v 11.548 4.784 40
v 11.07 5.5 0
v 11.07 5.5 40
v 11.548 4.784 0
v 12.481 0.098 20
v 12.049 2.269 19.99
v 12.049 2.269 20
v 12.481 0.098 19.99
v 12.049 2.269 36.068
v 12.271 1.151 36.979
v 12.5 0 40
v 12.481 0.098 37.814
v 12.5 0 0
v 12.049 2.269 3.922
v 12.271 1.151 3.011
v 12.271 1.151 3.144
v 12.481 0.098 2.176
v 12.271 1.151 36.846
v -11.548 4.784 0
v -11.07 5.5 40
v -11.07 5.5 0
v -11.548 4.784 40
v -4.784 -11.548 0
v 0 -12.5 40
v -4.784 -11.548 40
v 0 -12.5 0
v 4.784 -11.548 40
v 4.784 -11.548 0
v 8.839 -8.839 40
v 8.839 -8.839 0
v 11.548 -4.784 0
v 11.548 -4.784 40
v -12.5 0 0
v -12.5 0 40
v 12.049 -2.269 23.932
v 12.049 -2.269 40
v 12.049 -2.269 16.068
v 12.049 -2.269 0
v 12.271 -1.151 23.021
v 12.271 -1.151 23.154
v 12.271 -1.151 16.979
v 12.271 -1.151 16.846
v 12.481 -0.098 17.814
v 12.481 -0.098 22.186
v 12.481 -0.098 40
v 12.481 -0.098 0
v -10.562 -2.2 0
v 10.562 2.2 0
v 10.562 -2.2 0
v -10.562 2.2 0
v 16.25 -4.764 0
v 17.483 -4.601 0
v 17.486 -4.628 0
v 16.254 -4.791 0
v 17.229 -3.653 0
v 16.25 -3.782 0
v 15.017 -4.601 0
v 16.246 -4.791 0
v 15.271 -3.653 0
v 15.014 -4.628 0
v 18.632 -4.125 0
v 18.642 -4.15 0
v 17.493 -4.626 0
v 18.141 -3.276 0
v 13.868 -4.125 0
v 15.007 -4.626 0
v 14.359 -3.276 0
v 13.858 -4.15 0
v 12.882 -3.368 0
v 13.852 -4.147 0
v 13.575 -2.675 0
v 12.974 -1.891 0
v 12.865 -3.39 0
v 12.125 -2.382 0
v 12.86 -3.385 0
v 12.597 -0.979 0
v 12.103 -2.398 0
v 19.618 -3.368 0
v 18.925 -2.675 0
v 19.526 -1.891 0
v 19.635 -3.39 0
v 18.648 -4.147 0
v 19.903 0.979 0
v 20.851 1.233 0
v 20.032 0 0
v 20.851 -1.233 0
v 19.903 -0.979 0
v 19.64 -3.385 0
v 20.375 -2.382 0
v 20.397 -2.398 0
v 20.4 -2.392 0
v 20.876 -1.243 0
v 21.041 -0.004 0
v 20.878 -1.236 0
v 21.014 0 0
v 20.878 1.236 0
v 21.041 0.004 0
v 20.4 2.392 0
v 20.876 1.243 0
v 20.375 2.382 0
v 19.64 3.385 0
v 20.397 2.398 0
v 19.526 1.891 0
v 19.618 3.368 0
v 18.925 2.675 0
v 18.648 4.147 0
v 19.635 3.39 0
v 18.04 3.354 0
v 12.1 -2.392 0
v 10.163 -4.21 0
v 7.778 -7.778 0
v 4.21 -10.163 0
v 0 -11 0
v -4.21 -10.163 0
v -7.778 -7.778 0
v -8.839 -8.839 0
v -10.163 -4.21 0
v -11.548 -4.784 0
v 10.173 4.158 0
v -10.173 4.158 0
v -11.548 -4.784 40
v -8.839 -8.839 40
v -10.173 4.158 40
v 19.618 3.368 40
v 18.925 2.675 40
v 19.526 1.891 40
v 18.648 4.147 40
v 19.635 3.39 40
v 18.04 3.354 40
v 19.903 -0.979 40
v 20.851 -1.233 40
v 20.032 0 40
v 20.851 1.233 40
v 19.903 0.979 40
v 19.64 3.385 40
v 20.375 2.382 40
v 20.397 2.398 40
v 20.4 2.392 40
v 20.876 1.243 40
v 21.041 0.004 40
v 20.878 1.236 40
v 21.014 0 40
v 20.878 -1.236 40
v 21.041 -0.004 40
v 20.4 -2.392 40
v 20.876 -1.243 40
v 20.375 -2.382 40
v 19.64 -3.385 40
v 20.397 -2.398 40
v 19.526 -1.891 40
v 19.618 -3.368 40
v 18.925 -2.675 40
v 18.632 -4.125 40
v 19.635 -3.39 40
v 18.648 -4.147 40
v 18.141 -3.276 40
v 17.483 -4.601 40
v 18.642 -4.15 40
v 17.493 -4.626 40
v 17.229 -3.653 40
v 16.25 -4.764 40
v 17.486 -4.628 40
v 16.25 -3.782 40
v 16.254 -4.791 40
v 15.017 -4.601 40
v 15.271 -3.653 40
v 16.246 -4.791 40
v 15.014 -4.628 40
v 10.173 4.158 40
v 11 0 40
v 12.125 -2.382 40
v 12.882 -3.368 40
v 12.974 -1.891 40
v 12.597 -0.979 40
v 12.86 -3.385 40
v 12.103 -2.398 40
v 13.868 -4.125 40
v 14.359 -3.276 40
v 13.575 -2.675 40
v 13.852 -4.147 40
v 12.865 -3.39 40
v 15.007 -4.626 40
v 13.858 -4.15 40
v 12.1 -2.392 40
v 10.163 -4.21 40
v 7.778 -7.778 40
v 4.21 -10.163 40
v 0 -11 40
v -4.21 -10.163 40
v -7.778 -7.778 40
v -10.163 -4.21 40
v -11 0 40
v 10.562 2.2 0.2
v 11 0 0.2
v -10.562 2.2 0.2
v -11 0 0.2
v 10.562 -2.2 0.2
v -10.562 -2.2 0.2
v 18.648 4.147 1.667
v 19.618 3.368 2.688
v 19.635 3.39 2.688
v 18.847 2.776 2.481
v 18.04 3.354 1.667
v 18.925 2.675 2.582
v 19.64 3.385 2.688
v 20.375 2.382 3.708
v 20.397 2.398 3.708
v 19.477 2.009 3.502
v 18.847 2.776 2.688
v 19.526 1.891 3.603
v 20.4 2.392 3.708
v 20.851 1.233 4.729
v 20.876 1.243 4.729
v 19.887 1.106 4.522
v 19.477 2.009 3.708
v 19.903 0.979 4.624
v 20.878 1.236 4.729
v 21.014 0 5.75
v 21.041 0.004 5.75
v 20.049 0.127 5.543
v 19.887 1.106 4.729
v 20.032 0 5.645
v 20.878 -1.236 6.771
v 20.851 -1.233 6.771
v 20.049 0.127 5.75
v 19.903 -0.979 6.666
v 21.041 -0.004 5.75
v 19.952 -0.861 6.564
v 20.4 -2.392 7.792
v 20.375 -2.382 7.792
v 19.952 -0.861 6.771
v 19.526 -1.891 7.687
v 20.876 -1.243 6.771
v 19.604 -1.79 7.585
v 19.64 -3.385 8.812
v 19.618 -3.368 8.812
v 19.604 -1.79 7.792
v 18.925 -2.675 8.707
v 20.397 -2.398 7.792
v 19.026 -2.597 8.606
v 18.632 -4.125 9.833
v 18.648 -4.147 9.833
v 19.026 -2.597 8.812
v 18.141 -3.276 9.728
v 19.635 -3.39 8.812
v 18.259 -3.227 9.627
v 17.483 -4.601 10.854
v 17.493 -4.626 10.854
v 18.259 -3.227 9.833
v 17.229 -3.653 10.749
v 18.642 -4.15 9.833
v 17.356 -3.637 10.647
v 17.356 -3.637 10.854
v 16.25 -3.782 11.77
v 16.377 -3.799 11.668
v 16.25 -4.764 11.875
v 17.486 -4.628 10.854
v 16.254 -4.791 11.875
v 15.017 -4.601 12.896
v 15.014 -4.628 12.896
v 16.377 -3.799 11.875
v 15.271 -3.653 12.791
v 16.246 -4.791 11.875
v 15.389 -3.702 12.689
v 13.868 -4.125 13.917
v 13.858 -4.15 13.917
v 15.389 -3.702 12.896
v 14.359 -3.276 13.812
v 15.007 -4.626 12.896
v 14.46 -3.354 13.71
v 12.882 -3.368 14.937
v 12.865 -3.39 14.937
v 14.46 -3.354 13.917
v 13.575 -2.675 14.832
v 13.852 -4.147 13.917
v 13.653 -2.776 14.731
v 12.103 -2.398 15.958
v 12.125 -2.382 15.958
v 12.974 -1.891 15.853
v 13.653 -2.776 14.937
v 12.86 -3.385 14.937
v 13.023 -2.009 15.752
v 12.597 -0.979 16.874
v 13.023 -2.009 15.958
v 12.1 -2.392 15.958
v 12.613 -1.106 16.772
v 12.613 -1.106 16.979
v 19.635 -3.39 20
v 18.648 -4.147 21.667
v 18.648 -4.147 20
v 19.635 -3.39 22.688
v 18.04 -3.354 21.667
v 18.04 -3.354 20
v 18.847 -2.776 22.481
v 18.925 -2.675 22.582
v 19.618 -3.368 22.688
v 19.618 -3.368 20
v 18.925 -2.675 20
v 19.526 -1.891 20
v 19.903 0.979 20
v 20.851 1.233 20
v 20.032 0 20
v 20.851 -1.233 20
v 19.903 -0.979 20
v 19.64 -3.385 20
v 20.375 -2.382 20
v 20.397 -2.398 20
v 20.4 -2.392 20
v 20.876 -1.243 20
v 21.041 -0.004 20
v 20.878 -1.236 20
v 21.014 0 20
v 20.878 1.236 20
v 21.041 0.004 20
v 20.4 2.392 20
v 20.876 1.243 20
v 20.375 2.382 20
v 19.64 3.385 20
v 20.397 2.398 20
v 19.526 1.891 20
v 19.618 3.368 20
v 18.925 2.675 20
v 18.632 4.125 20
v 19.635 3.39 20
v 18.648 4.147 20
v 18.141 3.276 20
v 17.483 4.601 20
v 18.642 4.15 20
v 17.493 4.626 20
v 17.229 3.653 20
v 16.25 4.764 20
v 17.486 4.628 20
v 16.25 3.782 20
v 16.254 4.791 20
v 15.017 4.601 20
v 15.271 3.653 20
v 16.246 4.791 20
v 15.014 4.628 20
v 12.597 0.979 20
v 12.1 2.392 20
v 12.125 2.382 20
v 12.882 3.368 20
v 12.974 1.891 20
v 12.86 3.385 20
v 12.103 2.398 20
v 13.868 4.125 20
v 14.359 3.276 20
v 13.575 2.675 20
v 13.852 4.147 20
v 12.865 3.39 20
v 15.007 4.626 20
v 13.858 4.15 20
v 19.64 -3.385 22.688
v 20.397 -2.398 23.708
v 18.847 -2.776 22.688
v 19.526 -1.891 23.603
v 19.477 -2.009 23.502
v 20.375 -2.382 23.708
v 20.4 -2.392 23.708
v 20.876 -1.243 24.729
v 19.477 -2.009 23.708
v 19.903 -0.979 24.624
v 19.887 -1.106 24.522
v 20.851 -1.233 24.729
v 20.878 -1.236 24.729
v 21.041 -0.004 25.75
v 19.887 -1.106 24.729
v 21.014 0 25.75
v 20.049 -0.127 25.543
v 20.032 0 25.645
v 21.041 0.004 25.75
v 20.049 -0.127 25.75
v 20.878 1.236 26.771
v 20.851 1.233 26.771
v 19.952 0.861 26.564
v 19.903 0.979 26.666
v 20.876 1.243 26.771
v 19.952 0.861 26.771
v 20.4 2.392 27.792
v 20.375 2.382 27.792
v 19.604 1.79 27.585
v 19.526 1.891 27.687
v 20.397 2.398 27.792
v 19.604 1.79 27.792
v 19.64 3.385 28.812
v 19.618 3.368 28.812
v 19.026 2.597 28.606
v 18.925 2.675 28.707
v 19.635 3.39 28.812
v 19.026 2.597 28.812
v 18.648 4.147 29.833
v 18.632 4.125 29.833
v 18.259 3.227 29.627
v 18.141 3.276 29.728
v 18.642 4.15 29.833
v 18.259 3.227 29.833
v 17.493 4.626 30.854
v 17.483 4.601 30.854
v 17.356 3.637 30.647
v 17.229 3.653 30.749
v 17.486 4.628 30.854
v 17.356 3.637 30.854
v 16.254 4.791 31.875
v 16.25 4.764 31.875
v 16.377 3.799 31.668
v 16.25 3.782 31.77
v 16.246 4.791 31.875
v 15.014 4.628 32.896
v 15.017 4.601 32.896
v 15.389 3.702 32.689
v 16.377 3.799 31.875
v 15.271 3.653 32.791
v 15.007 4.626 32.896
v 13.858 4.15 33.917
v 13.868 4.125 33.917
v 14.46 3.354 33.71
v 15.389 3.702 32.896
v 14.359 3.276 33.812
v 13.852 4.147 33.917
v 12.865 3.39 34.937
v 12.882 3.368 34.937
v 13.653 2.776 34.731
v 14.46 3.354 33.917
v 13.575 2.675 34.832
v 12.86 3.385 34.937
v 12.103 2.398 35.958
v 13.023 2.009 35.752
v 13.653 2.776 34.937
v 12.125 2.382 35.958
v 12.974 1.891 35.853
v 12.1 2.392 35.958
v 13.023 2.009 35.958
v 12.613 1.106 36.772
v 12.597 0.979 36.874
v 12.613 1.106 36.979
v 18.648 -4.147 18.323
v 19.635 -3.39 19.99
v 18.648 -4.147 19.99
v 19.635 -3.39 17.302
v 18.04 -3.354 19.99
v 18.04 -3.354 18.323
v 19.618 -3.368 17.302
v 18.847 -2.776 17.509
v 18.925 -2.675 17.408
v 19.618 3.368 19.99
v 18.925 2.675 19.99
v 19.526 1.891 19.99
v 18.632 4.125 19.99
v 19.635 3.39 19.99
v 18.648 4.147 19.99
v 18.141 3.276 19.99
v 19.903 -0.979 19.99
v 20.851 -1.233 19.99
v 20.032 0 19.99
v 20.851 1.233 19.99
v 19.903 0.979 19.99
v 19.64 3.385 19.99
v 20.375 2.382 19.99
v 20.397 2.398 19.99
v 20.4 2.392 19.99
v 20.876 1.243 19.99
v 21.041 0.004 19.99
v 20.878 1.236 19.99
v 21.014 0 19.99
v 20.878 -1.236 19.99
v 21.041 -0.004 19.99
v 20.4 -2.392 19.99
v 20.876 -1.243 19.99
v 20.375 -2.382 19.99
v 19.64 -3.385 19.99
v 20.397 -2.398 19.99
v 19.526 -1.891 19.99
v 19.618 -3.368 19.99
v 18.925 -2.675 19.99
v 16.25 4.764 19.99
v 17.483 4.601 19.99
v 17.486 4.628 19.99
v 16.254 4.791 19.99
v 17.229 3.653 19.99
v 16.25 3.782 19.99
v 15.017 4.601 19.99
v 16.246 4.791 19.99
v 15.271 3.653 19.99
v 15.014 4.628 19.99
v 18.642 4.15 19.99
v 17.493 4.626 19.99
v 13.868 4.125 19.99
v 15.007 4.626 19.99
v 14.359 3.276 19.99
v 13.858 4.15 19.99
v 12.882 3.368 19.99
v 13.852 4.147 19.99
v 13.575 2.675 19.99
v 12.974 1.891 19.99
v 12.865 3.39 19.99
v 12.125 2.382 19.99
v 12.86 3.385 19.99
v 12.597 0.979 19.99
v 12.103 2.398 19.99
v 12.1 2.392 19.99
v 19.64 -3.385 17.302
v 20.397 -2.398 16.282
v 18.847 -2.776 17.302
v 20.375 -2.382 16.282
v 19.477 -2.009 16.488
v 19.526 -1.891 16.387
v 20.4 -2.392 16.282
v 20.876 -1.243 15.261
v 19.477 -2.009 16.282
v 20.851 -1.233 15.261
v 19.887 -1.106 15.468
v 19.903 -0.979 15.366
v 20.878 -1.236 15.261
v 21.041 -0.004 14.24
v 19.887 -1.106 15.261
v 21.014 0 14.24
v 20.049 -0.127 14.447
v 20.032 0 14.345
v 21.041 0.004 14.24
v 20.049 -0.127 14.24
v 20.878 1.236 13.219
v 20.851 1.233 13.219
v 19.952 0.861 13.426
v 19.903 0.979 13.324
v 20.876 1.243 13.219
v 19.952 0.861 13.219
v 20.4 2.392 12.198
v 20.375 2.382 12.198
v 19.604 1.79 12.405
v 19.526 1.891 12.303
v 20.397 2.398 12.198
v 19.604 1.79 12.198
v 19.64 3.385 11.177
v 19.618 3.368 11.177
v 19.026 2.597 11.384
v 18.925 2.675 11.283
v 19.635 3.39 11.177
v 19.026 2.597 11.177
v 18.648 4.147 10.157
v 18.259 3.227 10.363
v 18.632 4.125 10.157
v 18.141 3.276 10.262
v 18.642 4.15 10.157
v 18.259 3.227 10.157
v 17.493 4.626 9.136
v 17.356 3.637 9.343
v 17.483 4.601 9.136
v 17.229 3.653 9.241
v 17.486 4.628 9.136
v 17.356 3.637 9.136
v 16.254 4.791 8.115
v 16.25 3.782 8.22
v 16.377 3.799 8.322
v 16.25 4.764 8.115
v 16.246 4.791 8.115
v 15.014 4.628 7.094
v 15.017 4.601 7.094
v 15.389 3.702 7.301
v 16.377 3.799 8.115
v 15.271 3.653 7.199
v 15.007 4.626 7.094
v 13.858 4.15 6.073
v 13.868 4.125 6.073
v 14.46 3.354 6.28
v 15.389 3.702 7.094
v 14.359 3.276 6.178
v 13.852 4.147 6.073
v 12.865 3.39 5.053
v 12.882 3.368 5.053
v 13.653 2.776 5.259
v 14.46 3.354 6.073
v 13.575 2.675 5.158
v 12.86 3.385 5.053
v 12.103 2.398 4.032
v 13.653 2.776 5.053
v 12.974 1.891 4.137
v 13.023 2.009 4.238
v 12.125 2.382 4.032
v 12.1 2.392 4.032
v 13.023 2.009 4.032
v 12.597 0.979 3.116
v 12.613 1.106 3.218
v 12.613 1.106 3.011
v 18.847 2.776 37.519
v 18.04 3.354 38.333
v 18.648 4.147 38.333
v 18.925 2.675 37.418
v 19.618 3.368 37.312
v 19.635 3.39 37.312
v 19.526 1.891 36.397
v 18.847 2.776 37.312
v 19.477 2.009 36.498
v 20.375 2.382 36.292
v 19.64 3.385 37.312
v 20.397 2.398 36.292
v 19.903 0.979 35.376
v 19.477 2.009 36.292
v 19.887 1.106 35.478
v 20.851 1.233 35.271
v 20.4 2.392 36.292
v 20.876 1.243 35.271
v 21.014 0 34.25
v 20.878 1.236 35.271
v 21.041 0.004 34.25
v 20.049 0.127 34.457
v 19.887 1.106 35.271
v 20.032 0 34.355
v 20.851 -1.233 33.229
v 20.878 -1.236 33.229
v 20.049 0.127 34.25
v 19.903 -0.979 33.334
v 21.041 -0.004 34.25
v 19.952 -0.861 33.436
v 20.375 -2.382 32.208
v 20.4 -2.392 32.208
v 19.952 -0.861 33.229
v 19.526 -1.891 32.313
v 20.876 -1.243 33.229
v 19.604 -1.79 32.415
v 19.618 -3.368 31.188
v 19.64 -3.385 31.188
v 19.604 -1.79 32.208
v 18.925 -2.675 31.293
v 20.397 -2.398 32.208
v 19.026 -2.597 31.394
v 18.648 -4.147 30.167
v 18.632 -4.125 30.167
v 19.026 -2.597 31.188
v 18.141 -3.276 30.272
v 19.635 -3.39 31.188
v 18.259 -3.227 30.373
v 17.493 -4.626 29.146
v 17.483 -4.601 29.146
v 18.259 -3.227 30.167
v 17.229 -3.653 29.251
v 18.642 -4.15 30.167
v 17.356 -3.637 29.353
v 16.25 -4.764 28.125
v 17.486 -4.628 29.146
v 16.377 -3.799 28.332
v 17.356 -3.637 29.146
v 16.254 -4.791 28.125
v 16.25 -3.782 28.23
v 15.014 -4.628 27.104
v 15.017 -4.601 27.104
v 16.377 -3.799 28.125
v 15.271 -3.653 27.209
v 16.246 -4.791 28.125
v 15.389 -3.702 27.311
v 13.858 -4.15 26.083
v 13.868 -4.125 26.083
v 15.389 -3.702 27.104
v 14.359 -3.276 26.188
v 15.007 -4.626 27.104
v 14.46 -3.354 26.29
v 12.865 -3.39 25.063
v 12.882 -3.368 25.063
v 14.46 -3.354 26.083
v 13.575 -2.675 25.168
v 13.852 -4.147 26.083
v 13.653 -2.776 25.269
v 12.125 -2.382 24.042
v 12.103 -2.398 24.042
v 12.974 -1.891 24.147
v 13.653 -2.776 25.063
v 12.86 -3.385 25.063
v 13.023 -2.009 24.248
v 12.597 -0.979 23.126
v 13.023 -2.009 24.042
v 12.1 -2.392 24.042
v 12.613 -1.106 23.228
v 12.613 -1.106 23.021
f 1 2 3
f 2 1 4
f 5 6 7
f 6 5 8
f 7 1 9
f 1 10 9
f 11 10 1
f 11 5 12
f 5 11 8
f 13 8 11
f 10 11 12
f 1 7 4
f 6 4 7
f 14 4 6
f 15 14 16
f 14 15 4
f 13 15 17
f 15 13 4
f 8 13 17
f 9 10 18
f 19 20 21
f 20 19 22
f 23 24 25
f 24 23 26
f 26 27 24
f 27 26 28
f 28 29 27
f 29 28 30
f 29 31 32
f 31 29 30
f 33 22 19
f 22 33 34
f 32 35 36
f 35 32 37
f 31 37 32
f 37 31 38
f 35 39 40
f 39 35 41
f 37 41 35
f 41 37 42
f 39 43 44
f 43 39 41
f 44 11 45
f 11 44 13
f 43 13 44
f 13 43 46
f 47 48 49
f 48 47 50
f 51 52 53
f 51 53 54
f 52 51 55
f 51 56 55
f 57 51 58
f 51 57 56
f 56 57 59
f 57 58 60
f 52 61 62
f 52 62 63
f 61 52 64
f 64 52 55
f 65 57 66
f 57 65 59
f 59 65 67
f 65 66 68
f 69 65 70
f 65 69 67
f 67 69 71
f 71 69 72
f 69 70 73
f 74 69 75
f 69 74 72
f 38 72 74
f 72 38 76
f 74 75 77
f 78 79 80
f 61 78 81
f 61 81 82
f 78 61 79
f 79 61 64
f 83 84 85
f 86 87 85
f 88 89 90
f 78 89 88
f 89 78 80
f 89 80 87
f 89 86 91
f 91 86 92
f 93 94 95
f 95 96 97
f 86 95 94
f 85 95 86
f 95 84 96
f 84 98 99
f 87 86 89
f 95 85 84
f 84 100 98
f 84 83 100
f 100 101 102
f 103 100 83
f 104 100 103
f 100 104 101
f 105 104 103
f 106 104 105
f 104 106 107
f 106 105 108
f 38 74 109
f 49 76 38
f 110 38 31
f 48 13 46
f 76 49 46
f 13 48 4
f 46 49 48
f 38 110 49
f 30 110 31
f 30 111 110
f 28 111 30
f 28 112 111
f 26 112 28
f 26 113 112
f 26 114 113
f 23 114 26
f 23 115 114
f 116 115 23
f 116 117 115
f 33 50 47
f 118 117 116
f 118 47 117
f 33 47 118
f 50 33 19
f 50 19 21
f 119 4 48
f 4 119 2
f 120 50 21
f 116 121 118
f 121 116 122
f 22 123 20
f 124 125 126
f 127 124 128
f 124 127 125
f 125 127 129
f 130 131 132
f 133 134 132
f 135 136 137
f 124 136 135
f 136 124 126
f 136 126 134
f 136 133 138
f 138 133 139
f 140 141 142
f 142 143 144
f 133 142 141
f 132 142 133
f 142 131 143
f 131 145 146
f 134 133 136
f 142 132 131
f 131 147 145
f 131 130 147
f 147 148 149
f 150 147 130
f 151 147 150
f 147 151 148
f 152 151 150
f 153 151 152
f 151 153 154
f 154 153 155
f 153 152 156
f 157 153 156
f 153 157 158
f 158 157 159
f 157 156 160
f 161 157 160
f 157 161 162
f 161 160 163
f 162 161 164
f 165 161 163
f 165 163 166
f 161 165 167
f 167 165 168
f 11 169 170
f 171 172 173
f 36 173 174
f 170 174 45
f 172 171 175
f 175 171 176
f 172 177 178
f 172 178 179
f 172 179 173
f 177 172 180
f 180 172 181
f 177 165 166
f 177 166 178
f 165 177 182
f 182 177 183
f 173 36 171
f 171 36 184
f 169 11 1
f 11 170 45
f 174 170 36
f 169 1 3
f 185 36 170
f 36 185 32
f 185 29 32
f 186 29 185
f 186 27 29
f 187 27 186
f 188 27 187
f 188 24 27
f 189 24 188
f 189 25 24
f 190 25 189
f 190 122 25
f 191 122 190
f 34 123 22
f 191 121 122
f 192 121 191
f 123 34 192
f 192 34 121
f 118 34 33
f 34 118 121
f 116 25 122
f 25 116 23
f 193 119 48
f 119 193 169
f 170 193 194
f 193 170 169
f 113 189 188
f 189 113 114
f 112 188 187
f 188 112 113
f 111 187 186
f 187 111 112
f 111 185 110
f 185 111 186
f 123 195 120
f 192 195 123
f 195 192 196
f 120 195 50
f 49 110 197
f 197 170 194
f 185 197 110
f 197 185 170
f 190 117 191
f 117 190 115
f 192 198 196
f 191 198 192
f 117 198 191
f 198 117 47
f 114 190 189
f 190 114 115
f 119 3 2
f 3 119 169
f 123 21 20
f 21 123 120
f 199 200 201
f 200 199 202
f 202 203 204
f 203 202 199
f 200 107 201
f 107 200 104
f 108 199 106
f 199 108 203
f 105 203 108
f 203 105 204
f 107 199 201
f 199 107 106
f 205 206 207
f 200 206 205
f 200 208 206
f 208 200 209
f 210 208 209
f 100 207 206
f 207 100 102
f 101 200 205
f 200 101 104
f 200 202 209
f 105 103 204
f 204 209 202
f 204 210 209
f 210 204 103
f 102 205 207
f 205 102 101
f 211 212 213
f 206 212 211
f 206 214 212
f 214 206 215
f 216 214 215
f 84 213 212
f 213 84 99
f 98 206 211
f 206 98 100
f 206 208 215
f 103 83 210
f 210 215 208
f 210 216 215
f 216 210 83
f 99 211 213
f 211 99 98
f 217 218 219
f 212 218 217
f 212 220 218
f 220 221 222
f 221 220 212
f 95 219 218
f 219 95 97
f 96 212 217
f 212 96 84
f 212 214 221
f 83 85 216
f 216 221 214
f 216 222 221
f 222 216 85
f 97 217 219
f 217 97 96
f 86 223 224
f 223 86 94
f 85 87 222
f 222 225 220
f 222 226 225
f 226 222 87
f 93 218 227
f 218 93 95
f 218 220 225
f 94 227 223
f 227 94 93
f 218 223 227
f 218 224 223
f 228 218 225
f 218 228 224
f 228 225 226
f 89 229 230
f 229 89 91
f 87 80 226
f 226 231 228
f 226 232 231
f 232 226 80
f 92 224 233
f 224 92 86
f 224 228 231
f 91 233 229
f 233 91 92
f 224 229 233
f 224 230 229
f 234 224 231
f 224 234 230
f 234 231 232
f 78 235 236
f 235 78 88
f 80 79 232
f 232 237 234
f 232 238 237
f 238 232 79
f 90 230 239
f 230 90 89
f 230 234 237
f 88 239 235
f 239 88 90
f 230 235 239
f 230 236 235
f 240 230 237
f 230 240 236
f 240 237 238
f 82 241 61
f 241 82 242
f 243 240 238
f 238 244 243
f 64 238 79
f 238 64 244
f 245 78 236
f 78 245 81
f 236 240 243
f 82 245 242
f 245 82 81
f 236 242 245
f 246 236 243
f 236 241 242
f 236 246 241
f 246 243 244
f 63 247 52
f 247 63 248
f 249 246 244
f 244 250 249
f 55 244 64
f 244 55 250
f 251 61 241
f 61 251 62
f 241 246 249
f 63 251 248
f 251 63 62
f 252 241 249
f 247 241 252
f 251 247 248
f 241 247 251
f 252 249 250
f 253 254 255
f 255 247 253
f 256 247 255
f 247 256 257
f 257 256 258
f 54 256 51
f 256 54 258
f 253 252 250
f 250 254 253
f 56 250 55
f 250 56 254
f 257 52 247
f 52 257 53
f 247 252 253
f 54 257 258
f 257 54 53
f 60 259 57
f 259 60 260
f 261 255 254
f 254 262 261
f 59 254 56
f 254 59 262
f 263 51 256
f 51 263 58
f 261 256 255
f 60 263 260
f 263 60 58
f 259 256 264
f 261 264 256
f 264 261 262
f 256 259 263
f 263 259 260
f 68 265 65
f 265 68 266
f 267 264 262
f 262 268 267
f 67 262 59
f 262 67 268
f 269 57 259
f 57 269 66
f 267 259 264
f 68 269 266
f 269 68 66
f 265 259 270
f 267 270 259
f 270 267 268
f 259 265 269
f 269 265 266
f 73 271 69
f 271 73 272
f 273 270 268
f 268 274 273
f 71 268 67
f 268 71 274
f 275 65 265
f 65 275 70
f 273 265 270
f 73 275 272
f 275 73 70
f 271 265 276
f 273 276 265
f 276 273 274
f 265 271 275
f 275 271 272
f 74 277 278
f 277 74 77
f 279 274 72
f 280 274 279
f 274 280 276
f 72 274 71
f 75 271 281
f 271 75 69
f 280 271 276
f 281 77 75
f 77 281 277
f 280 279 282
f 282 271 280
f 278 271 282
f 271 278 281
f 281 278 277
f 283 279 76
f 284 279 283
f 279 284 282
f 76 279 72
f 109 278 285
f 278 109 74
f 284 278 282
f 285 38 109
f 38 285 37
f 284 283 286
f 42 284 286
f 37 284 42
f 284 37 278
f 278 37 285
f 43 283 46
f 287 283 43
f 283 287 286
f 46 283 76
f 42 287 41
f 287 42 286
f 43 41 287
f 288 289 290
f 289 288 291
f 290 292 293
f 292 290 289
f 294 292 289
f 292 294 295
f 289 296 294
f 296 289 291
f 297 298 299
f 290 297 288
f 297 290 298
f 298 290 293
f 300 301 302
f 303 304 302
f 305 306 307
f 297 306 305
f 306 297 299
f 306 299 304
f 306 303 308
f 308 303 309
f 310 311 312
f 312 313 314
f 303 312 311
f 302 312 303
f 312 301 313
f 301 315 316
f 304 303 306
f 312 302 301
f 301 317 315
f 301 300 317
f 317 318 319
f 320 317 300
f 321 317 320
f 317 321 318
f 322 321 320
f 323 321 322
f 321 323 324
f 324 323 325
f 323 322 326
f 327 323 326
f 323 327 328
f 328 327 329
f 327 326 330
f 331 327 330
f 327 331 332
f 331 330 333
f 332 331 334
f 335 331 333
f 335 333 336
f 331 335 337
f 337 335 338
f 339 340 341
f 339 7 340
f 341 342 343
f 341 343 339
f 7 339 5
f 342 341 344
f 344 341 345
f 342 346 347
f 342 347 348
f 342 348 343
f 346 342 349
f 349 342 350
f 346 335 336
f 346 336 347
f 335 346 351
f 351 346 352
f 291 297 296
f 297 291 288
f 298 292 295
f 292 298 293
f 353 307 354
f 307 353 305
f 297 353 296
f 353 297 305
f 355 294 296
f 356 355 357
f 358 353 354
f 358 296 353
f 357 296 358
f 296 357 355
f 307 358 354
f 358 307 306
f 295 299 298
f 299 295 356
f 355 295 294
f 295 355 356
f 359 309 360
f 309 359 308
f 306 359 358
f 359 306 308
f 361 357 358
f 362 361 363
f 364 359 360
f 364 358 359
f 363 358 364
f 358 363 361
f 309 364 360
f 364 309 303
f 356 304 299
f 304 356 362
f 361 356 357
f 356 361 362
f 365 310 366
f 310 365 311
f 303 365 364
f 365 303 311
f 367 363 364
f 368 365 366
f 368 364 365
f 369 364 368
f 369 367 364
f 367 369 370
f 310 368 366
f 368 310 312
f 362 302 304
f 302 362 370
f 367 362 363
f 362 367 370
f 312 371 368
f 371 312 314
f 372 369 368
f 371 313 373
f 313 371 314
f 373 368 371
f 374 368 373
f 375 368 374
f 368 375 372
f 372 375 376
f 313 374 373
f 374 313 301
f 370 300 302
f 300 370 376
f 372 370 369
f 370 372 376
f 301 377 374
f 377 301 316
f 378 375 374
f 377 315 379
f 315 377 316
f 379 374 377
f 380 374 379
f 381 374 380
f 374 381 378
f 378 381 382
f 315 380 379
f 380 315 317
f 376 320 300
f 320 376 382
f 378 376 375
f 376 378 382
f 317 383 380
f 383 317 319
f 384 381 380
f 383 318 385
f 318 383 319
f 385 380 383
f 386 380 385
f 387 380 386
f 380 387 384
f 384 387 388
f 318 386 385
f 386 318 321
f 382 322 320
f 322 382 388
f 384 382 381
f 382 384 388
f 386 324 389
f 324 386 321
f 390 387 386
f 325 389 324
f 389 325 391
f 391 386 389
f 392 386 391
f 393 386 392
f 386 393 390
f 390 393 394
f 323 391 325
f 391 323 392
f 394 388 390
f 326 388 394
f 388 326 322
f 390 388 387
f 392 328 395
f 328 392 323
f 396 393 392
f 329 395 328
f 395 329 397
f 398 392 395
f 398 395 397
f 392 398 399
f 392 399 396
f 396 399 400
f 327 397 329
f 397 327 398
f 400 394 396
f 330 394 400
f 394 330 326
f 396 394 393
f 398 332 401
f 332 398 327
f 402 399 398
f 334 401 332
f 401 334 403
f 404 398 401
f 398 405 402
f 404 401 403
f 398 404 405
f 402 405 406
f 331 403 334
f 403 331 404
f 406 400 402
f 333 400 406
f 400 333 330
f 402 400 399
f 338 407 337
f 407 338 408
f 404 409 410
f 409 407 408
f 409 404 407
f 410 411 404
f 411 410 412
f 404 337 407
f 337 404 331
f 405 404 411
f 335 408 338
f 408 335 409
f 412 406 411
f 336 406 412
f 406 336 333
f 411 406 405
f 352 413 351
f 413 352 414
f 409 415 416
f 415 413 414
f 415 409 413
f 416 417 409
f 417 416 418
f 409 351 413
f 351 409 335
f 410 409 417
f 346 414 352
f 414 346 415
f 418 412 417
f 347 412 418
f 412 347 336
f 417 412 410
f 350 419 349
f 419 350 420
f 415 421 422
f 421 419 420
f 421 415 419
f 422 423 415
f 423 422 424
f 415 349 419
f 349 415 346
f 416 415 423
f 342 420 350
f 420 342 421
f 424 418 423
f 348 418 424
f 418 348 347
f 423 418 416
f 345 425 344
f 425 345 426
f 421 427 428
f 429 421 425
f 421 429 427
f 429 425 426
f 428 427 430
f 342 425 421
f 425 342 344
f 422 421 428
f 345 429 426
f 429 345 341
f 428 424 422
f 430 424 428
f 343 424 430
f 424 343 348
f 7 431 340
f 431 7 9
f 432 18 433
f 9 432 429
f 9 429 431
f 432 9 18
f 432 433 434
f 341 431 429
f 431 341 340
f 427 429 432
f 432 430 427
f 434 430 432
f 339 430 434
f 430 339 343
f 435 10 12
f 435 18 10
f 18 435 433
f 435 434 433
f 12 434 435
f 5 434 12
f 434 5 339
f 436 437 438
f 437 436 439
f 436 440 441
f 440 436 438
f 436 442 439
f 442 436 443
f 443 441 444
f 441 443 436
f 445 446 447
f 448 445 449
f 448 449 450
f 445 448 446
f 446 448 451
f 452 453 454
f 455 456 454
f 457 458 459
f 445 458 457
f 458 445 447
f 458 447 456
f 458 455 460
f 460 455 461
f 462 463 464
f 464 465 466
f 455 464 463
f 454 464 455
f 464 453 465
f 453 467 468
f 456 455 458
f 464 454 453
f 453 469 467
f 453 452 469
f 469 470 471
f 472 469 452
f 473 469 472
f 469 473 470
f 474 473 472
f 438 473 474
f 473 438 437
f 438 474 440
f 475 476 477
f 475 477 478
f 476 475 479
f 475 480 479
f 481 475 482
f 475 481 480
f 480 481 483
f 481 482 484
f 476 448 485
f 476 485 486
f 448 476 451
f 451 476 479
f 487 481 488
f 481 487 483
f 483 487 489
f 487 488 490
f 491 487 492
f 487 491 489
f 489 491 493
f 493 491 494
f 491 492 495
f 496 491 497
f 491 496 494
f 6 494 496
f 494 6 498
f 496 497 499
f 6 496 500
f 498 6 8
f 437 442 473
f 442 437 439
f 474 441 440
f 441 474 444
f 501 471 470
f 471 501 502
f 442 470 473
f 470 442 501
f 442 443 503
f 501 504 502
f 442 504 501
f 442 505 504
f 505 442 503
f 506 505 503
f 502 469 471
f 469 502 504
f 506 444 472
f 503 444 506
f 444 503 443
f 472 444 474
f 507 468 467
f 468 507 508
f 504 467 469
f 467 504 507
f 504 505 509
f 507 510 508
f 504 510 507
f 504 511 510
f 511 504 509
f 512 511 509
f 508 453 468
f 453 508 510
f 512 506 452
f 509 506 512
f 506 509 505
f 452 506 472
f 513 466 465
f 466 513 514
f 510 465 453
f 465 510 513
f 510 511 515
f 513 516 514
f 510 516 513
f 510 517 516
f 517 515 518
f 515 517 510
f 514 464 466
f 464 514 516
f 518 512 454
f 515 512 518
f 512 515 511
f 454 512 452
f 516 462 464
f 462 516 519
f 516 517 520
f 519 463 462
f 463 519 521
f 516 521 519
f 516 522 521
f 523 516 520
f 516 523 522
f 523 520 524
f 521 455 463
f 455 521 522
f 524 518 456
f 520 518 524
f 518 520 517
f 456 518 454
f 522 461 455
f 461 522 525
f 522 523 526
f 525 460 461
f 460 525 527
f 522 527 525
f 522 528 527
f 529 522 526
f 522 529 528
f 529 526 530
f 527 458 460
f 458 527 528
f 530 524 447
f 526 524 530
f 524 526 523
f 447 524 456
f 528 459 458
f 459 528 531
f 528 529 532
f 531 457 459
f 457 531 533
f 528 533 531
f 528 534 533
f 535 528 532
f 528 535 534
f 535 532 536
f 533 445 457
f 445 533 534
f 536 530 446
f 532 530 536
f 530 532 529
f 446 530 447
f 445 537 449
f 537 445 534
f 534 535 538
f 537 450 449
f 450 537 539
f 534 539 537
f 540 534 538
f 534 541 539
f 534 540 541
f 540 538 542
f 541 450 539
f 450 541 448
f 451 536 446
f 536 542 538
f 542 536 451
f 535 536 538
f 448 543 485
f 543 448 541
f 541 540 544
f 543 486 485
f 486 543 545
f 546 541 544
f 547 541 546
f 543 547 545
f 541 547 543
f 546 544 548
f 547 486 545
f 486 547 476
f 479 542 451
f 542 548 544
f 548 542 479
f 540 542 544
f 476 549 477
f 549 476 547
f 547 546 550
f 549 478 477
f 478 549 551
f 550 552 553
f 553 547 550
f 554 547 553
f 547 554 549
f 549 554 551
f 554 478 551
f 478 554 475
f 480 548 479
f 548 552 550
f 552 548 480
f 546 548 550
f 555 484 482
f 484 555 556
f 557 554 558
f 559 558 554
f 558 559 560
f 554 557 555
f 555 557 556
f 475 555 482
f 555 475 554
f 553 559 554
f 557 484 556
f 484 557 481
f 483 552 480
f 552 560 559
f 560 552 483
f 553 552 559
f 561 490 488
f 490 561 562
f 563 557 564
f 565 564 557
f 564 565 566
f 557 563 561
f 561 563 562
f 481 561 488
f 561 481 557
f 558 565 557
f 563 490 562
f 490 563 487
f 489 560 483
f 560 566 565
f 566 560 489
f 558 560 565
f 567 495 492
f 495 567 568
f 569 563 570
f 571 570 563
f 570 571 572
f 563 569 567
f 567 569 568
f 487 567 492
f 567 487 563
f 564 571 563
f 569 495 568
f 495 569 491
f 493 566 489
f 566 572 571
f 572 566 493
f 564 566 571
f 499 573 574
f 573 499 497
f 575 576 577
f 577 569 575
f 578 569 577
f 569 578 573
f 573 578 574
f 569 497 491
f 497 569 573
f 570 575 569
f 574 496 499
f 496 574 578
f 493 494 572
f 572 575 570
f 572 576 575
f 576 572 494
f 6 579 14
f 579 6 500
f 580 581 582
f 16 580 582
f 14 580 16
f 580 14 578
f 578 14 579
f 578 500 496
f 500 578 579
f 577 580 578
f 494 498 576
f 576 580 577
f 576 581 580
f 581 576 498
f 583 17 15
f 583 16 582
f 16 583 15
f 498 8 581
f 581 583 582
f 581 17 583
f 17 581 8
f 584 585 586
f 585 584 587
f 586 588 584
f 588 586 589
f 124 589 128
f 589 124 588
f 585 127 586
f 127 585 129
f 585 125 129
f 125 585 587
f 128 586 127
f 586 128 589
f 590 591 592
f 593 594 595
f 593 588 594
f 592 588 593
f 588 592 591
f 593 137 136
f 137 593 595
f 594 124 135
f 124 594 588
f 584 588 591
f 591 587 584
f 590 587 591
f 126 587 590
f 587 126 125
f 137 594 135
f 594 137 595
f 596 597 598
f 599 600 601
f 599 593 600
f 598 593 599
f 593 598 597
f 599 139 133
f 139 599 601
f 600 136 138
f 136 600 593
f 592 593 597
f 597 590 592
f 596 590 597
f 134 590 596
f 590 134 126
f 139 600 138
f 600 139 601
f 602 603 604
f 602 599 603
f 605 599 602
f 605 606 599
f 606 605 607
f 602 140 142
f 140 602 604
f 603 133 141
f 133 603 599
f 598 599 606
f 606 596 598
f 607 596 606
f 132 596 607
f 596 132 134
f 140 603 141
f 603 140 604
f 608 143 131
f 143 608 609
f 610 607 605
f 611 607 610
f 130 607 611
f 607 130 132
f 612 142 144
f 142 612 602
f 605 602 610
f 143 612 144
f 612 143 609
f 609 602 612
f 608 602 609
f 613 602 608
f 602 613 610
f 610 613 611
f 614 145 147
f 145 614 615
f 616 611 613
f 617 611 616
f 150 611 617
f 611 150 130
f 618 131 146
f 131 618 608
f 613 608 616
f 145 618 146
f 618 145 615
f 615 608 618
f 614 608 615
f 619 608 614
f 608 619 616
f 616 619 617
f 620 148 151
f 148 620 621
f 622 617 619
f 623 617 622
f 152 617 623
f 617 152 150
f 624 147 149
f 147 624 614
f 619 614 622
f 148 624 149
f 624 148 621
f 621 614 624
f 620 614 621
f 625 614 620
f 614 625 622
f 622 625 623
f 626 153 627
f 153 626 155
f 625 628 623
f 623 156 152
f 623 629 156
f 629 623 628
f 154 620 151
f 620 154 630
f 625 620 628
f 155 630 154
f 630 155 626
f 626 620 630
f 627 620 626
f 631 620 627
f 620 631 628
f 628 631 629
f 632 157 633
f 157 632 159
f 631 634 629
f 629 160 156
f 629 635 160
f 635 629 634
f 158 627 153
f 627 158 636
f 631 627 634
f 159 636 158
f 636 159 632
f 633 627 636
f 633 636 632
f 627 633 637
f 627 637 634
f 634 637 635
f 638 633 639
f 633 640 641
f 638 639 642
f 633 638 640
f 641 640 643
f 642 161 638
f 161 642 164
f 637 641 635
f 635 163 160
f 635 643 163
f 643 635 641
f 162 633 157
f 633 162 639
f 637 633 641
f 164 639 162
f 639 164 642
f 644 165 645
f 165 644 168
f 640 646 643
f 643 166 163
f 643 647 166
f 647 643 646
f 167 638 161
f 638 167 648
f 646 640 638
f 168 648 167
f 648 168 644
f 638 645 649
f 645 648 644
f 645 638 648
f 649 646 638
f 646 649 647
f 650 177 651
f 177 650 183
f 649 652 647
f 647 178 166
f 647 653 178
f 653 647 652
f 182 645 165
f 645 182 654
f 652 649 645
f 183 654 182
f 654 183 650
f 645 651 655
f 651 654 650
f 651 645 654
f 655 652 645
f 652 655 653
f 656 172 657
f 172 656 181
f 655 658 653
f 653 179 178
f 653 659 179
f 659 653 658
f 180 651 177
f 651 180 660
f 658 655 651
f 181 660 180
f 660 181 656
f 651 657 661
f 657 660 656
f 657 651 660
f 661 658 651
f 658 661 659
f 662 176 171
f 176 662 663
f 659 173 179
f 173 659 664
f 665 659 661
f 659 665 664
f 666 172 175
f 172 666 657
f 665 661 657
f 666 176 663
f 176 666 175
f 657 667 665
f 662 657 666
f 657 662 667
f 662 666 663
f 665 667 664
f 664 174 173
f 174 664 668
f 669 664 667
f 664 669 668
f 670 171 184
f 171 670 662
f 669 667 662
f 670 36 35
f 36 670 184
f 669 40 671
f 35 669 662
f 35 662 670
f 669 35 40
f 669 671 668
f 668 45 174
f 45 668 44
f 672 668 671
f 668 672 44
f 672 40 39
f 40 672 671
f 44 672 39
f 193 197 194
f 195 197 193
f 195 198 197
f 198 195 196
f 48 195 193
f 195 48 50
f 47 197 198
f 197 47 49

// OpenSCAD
// GasStrutWireClip.scad
//
// Clip for retaining wire on gas strut supporting lifting roof
//

delta = 0.01 ;

module helixringsegment(r1, r2, sh1, sh2, sn, ns, sw) {
    assert(r2>r1, "helixring: angle r2 must be greater than r1") ;
    translate([r2,0,0])
        rotate([0, -90, 0])
            linear_extrude(height=(r2-r1), center=false)
                polygon(
                    points = [ [0,-sw/2], [sh1,-sw/2], [sh2, sw/2], [0,sw/2] ],
                    paths  = [ [ 0, 1, 2, 3, 0 ] ]
                ) ;
    // cube(size=[h1, h2, r2]) ;
}
////-helixringsegment(r1, r2, h, sn, ns, sw)-
// helixringsegment(10, 12, 20, 10, 20, 3) ;

// Helical ring.  Used as part of wire-retaining hooks.
//
// The helix allows the ring to be printed without support.
//
// The ring has a "flat" end which is normal to the centre axis,
// and a sloping edge that progresses from 0 to "h" around the
// circumference, proceeding anticlockwise as viewed from +Z.
//
// The "flat" end of the ring lies on the X-Y plane, centred on 
// the origin, with the sloping edge progressing in the +Z direction.
//
// r1	= inner radius of ring
// r2   = outer radius of ring
// d1   = inner diameter of ring
// d2   = outer diameter of ring
// h1   = start height of helix
// h2   = end height of helix, overall height of ring ((a2-a1)/pi for 45 degree climb)
// a1   = start angle of ring (zero height)
// a2   = end angle of ring (full height h)
// ns   = number of steps (goes 0 to ns-1)
//

module helixring(r1=0, r2=0, d1=0, d2=0, h1=0, h2=0, a1=0, a2=180, ns=16) {
    r1 = r1 != 0 ? r1 : d1/2 ;      // Use d1 if r1 is zero
    r2 = r2 != 0 ? r2 : d2/2 ;      // Use d2 if r2 is zero
    ar = (a2-a1)*PI/180 ;           // Sweep angle in radians
    sw = r2*ar/ns ;                 // Segment width
    /// assert(a2>a1, "helixring: angle a2 must be greater than a1") ;
    assert(r2>r1, "helixring: angle r2 must be greater than r1") ;
    difference() {
        translate([0,0, 0]) {
            for (sn = [0:ns-1]) {
                a   = a1 + ((sn+0.5)/ns)*(a2-a1) ;
                sh1 = h1 + (sn/ns) * (h2-h1) ;
                sh2 = h1 + ((sn+1)/ns) * (h2-h1) ;
                rotate([0,0,a])
                    helixringsegment(r1, r2, sh1, sh2, sn, ns, sw) ;
            }
        }
    }
}
////-helixring(r1=0, r2=0, d1=0, d2=0, h1=0, h2=0, a1=0, a2=180, ns=16)-
//// helixring(r1=10, r2=12, h2=10*PI, a1=0, a2=180, ns=24) ;
//// helixring(d1=30, d2=32, h1=5, h2=10*PI, a1=0, a2=180, ns=24) ;

// Tube
module tube(id, t, l) {
    //
    // id   = inside diameter
    // t    = wall thickness
    // l    = length
    //
    difference() {
        cylinder(d=id+2*t, h=l, $fn=16) ;
        translate([0,0,-delta])
            cylinder(d=id, h=l+2*delta, $fn=16) ;
    }
}

// Wire clip
module wireclip(cd, ct, cl, hd, ht) {
    // Wire clip printed vertically at XY plane origin.
    //
    // cd   = clip inside diameter
    // ct   = clip thickness
    // cl   = clip length
    // hd   = hook inside diameter    
    // ht   = hook thickness
    //
    hl1 = cl*0.45 ;
    hl2 = cl/24 ;
    difference() {
        tube(cd, ct, cl) ;
        translate([0,cd*0.5,-delta])
            cylinder(d=cd+ct*2, cl+2*delta, $fn=16) ;
    }
    // For better bed adhesion
    translate([-cd/2,-cd*0.1,0])
        cube(size=[cd,cd*0.2,0.2]) ;
    // Wire retainer
    translate([cd/2+hd/2+ct,0,0]) {
        translate([0,0,0])
            helixring(d1=hd, d2=hd+2*ht, h1=hl2, h2=hl1, a1=180+240, a2=180, ns=16) ;
        translate([0,0,cl/2])
            helixring(d1=hd, d2=hd+2*ht, h1=hl2, h2=hl1, a1=180-240, a2=180, ns=16) ;
        translate([0,0,cl/2-delta])
            mirror([0,0,1])
                helixring(d1=hd, d2=hd+2*ht, h1=hl2, h2=hl1, a1=180-240, a2=180, ns=16) ;
        translate([0,0,cl])
            mirror([0,0,1])
                helixring(d1=hd, d2=hd+2*ht, h1=hl2, h2=hl1, a1=180+240, a2=180, ns=16) ;
    }
}
////-wireclip(cd, ct, cl, hd, ht)-
wireclip(22, 1.5, 40, 7.5, 1) ;
//// translate([0,20,0])
////     wireclip(10, 1.2, 32, 6, 1) ;
